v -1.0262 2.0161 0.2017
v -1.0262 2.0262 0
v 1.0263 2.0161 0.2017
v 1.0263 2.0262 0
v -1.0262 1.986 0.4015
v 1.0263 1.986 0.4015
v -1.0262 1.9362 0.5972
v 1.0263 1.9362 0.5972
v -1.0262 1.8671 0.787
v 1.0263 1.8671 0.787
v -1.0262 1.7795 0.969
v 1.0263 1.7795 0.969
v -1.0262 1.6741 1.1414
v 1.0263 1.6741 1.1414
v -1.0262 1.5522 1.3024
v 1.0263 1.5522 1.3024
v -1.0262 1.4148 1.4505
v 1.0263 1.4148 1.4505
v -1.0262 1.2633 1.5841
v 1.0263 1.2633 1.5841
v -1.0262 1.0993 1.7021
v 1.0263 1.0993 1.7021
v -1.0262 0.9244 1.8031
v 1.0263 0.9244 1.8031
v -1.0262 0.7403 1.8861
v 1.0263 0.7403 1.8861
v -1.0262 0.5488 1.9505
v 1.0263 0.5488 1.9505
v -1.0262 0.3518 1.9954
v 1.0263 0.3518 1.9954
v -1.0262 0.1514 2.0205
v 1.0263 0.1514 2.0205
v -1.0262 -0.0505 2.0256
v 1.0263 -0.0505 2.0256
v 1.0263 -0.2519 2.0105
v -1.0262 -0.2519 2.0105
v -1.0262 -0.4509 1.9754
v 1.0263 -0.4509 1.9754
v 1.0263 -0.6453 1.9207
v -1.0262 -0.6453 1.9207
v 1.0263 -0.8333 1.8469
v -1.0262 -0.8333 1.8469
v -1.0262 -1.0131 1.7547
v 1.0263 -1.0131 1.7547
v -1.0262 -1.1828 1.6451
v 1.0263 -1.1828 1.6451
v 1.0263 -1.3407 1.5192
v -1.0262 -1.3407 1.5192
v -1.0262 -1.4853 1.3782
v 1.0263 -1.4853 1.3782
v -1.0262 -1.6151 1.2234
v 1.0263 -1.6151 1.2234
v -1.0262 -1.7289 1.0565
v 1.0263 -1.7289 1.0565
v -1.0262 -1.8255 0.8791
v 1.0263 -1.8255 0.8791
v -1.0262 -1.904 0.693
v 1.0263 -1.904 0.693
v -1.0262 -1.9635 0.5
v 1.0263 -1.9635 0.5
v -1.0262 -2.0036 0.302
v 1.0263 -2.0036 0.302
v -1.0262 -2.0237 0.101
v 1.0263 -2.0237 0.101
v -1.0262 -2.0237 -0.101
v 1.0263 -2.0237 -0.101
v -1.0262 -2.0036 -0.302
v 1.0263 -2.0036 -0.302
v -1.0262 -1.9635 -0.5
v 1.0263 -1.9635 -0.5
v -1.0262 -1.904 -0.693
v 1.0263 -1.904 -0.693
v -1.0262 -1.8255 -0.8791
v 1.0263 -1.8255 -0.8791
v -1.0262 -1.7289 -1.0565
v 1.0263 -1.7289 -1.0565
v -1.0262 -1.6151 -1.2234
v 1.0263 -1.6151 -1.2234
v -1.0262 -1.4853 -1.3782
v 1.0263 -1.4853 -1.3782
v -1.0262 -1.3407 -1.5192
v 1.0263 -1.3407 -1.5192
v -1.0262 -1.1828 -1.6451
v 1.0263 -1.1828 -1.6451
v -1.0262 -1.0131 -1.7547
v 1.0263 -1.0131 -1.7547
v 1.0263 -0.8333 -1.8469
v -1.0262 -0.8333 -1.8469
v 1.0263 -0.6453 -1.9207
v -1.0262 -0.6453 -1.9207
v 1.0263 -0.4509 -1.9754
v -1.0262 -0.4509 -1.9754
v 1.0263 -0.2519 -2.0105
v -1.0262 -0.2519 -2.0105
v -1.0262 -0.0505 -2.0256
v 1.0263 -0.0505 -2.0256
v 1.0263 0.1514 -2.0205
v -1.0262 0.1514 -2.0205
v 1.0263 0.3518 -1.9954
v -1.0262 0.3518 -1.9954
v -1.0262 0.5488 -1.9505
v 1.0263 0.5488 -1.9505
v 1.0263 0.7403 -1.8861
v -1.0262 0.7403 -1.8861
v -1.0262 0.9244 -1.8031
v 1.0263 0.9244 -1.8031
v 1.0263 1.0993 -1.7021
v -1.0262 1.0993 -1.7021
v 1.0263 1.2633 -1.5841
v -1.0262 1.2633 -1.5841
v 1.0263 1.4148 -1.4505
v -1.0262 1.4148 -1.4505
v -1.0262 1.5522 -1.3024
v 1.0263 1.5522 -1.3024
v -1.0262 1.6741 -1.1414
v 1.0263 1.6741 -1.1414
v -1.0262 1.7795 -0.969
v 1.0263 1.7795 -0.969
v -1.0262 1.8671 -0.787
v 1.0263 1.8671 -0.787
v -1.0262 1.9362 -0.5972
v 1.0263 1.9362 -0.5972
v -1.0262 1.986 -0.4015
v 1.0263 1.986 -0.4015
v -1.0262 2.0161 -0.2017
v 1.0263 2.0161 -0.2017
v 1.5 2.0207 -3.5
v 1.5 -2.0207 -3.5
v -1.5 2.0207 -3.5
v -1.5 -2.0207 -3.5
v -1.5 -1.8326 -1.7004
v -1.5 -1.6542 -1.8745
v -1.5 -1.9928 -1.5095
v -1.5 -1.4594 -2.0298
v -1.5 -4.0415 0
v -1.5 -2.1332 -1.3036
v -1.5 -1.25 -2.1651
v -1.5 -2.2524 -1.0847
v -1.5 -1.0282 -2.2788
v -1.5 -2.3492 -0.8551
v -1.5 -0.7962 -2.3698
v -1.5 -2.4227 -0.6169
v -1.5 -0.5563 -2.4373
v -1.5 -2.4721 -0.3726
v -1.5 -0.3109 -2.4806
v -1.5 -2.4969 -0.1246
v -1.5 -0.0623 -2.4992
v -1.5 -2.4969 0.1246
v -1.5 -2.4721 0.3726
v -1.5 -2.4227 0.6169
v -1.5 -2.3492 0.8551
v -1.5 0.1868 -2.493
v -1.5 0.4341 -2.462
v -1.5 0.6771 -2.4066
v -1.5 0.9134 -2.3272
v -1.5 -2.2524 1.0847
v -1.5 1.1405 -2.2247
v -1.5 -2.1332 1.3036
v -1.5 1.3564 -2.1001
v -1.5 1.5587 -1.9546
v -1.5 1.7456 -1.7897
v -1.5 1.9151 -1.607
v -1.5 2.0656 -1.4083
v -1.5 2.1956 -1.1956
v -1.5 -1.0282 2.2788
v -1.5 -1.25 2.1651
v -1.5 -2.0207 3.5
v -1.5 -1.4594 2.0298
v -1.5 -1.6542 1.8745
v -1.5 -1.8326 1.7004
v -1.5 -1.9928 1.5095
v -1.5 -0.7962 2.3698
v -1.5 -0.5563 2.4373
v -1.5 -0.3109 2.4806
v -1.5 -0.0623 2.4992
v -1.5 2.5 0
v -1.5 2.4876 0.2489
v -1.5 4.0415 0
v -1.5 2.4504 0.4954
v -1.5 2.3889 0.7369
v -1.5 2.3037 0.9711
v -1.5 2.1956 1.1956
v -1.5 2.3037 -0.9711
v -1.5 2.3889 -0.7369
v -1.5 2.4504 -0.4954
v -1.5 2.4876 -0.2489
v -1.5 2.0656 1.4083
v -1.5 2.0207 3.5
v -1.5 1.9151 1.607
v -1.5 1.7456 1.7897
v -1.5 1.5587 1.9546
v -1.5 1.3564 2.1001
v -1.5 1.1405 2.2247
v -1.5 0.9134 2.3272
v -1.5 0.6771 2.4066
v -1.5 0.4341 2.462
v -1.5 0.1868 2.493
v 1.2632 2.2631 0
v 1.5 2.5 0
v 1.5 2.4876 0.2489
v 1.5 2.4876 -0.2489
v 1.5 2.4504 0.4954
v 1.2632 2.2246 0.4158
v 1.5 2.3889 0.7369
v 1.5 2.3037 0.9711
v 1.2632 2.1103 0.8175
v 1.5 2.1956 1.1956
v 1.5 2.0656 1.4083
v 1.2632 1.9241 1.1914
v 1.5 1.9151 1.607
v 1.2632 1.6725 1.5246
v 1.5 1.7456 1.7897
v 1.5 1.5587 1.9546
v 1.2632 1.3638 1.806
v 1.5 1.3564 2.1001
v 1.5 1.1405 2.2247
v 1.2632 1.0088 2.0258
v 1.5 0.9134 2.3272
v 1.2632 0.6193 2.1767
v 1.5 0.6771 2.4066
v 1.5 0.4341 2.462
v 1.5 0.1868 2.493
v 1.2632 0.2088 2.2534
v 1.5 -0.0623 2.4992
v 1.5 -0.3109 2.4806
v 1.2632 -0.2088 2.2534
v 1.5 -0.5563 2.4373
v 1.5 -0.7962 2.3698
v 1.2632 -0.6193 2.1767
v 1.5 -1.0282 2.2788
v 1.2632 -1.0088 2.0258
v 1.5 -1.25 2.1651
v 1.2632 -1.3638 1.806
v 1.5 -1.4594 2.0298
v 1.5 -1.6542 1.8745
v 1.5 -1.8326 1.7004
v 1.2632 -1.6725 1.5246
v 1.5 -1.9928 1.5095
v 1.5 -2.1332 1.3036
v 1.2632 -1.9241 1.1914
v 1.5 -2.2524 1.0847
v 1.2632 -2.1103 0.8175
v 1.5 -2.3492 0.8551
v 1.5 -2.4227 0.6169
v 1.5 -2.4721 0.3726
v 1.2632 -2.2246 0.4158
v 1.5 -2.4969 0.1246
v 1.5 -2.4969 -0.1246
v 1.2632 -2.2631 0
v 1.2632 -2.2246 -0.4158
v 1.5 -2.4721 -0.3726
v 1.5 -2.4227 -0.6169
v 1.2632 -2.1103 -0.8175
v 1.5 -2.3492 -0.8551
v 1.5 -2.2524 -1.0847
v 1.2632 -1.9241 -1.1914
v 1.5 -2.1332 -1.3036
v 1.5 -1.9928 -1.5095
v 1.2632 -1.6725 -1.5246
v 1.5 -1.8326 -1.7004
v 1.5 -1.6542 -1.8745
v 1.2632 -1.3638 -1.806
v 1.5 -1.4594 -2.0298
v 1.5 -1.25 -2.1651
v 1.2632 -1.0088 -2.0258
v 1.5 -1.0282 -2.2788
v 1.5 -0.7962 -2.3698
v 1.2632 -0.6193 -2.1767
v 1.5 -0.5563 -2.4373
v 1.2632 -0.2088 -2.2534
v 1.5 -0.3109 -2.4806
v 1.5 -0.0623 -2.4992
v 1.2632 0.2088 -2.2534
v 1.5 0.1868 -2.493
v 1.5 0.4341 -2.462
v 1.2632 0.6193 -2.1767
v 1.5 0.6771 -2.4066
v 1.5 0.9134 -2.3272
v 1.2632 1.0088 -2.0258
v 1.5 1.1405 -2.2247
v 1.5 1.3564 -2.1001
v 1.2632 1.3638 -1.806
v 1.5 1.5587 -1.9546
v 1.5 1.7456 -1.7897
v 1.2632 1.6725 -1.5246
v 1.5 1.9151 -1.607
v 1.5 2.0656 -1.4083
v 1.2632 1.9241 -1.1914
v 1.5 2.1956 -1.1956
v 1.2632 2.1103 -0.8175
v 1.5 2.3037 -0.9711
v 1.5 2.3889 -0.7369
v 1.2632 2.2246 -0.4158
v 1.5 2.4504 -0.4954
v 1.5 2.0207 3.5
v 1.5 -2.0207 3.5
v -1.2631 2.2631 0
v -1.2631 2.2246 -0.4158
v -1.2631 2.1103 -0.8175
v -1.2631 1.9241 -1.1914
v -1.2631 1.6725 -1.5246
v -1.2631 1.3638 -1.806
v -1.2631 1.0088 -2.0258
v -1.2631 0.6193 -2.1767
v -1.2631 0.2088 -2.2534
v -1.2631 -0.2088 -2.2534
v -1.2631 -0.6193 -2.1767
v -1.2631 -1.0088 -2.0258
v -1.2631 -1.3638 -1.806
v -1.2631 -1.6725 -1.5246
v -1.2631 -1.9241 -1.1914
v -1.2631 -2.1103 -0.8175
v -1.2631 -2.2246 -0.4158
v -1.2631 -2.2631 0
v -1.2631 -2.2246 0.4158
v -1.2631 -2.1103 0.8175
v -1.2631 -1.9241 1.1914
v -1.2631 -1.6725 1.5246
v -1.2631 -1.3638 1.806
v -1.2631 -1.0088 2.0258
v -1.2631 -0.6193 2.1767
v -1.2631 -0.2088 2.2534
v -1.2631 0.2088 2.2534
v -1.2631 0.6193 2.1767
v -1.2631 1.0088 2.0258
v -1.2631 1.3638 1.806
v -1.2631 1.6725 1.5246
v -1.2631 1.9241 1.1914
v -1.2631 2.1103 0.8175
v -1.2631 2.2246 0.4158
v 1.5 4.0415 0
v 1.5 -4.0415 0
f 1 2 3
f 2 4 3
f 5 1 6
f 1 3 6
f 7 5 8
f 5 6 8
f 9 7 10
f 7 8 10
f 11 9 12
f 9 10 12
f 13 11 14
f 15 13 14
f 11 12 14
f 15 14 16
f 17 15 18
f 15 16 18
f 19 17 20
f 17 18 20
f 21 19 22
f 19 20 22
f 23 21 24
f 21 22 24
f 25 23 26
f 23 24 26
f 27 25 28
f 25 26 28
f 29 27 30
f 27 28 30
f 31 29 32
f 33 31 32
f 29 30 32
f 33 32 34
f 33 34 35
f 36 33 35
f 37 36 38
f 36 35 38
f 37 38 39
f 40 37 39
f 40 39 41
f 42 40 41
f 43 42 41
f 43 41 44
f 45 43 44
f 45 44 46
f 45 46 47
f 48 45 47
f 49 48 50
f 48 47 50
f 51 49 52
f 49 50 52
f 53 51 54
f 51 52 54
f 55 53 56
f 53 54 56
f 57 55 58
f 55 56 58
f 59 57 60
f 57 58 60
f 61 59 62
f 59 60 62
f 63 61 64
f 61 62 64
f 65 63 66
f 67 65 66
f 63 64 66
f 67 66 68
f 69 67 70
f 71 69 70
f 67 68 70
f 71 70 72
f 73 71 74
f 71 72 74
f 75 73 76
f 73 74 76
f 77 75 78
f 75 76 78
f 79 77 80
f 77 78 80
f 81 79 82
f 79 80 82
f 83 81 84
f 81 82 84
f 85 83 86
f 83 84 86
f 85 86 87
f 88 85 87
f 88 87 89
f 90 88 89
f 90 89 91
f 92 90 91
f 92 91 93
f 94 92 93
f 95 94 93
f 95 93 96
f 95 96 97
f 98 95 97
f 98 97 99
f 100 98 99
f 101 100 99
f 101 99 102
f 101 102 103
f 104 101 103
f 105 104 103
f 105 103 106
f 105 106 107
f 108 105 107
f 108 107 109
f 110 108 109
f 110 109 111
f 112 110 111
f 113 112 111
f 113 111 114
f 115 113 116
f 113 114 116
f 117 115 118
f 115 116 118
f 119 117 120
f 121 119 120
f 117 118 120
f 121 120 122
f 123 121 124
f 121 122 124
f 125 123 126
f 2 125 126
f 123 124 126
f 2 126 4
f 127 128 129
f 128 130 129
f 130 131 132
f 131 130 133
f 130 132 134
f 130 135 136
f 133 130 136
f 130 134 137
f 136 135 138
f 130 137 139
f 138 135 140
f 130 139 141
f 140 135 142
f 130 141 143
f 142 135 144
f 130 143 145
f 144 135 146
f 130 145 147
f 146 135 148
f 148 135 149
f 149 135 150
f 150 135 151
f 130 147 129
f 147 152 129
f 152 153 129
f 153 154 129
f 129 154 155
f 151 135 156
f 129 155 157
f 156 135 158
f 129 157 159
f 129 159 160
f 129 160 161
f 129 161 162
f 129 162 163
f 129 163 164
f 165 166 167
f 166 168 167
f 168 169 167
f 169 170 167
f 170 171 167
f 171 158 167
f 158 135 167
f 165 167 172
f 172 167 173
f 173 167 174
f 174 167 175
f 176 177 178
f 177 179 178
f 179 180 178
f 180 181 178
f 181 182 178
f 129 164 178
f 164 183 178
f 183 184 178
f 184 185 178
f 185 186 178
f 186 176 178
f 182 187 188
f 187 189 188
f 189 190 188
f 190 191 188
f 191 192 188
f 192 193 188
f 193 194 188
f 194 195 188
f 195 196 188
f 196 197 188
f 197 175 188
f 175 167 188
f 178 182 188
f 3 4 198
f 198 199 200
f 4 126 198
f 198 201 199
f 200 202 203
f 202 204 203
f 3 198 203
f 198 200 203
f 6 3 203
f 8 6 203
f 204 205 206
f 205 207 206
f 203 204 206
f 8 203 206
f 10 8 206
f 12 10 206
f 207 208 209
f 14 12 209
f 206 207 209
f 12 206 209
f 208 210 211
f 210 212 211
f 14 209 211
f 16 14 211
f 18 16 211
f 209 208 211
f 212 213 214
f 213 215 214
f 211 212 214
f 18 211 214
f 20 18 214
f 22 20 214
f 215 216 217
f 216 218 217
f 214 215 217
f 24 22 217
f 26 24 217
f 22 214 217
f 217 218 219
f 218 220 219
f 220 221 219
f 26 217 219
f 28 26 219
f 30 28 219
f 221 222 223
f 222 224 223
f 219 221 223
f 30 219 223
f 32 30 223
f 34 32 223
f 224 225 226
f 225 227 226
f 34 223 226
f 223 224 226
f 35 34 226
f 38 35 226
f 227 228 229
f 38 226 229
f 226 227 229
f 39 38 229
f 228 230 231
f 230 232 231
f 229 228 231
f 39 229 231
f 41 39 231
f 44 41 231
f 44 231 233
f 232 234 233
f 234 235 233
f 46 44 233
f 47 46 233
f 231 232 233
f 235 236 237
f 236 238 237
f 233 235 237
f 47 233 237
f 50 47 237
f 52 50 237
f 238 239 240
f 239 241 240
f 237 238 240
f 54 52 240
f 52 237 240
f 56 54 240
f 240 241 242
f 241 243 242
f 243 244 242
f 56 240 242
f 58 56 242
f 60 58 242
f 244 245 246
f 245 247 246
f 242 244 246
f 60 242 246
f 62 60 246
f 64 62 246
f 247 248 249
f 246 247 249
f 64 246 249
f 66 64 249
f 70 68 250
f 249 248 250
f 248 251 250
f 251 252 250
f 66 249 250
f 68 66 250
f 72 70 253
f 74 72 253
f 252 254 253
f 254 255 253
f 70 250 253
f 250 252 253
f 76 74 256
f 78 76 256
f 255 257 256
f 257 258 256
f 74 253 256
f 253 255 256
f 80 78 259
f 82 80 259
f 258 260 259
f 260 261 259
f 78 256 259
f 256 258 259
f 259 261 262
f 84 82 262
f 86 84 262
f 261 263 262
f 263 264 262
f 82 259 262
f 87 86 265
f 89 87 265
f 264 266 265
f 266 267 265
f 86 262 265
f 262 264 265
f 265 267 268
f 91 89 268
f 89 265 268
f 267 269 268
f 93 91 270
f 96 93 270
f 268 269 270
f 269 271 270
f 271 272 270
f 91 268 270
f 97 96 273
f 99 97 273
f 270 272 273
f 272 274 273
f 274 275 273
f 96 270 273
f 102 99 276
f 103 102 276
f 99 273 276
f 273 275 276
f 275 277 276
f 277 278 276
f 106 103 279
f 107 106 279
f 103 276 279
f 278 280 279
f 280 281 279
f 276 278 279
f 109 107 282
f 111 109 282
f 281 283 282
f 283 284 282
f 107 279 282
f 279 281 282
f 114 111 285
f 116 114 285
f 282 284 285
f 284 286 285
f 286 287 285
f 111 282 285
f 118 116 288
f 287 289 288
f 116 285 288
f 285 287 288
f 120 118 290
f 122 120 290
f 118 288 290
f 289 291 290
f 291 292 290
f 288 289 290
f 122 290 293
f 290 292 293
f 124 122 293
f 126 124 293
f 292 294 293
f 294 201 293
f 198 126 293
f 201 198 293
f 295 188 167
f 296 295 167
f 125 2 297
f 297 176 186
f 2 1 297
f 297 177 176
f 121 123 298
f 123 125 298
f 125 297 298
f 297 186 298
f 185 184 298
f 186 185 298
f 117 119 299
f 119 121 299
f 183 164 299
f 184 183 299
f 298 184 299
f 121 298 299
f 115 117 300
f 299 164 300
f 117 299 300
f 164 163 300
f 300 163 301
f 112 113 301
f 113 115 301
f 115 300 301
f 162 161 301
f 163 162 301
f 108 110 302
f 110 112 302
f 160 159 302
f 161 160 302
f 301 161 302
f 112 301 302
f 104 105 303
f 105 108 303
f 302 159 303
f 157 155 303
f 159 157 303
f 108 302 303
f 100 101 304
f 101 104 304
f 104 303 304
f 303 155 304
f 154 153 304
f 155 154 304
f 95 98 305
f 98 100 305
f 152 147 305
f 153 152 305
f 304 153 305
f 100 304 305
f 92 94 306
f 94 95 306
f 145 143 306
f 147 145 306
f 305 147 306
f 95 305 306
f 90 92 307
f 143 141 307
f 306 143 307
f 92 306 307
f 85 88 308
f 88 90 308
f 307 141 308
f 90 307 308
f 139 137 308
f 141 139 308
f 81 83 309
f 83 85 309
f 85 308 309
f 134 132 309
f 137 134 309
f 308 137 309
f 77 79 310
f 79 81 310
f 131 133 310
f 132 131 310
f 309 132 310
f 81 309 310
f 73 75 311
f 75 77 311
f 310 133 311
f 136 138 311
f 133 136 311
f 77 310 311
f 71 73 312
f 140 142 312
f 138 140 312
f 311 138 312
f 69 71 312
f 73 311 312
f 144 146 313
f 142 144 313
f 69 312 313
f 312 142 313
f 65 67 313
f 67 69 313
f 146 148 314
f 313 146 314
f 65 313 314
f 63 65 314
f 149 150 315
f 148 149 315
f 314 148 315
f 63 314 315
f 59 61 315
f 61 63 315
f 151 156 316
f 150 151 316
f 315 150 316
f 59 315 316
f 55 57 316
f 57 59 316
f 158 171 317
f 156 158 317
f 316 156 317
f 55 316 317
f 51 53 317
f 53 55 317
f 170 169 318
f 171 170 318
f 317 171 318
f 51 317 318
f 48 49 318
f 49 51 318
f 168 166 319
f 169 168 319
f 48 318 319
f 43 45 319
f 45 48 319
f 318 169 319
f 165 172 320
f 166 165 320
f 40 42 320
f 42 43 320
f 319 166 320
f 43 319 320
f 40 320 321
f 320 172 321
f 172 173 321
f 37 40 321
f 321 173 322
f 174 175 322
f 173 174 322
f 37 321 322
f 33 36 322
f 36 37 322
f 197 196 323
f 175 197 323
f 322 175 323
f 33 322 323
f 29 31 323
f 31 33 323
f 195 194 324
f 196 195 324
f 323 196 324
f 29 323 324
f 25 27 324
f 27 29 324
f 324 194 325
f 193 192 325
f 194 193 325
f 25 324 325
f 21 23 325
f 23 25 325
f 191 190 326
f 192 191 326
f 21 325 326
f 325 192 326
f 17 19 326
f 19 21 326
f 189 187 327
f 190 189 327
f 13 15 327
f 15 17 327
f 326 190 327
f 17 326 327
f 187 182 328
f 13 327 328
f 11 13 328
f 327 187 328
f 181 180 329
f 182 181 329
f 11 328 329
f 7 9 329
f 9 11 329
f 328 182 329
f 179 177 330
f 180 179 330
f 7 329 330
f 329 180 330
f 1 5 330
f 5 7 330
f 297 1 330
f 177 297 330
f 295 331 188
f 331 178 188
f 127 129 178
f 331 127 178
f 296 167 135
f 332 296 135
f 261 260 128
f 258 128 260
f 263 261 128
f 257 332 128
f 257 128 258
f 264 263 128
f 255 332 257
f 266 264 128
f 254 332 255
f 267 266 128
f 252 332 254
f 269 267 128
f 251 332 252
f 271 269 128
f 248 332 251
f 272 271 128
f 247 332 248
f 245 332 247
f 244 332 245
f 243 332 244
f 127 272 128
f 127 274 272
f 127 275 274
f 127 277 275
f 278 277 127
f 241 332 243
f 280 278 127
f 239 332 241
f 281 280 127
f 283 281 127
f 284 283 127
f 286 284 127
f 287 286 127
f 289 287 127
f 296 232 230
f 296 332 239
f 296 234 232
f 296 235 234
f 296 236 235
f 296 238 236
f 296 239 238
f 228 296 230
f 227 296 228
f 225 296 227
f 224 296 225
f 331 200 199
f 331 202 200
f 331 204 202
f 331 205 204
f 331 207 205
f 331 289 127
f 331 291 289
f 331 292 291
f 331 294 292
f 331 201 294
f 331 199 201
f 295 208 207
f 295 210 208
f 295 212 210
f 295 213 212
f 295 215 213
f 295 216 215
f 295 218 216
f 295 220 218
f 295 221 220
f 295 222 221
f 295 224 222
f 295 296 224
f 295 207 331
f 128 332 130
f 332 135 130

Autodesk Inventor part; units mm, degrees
sketch "Sketch_5" plane through (0, 0, 0) normal (0, 0, 1) x (1, 0, 0)
  line L0 (1.5, 0) -> (-1.5, 0)
  line L1 (-1.5, 0) -> (-1.5, 4.375)
  line L2 (-1.5, 4.375) -> (-1.1031, 5.0625)
  line L3 (-1.1031, 5.0625) -> (1.1031, 5.0625)
  line L4 (1.1031, 5.0625) -> (1.5, 4.375)
  line L5 (1.5, 4.375) -> (1.5, 0)
  line L6 (1.5, 0) -> (-1.5, 0)
  dimension "d8" = 3
revolve "Revolution1" add sketch "Sketch_5" angle 360 about axis through (1.5, 0, 0) along (1, 0, 0)
sketch "Sketch_6" plane through (0, 0, 0) normal (0, 0, 1) x (1, 0, 0)
  line L0 (1.5, 0) -> (-1.5, 0)
  line L1 (-1.5, 0) -> (-1.5, 2.5)
  line L2 (-1.5, 2.5) -> (-1.0262, 2.0262)
  line L3 (-1.0262, 2.0262) -> (1.0263, 2.0262)
  line L4 (1.0263, 2.0262) -> (1.5, 2.5)
  line L5 (1.5, 2.5) -> (1.5, 0)
  line L6 (1.5, 0) -> (-1.5, 0)
  line L7 (0, 2.0262) -> (0, 0)
  line L8 (0, 0) -> (0, 9.277)
  dimension "d10" = 3
revolve "Revolution2" cut sketch "Sketch_6" angle 360 about axis through (1.5, 0, 0) along (1, 0, 0)
thread "Thread1" size "M4x0.7" class "6H" standard "ISO Metric profile" full length
sketch "Sketch_7" plane through (0, 0, 0) normal (1, 0, 0) x (0, 1, 0)
  line L0 (-7, 7) -> (-7, -7)
  line L1 (-7, -7) -> (7, -7)
  line L2 (7, -7) -> (7, 7)
  line L3 (7, 7) -> (-7, 7)
  line L4 (-2.0207, 3.5) -> (-4.0415, 0)
  line L5 (-4.0415, 0) -> (-2.0207, -3.5)
  line L6 (-2.0207, -3.5) -> (2.0207, -3.5)
  line L7 (2.0207, -3.5) -> (4.0415, 0)
  line L8 (4.0415, 0) -> (2.0207, 3.5)
  line L9 (2.0207, 3.5) -> (-2.0207, 3.5)
extrude "Extrusion1" cut sketch "Sketch_7" along normal mid plane 3
ref_plane "cp_XY" through (0, 0, 0) normal (1, 0, 0) x (0, 0, -1)
ref_plane "cp_YZ" through (0, 0, 0) normal (0, 0, -1) x (0, 1, 0)
ref_plane "cp_ZX" through (0, 0, 0) normal (0, 1, 0) x (1, 0, 0)
ref_plane "nut_to_screw_XY" through (1.2, 0, 0) normal (1, 0, 0) x (0, 0, -1)
ref_plane "nut_to_screw_YZ" through (1.2, 0, 0) normal (0, 0, -1) x (0, 1, 0)
ref_plane "nut_to_screw_ZX" through (1.2, 0, 0) normal (0, 1, 0) x (1, 0, 0)
properties part number "SKNTR4"
